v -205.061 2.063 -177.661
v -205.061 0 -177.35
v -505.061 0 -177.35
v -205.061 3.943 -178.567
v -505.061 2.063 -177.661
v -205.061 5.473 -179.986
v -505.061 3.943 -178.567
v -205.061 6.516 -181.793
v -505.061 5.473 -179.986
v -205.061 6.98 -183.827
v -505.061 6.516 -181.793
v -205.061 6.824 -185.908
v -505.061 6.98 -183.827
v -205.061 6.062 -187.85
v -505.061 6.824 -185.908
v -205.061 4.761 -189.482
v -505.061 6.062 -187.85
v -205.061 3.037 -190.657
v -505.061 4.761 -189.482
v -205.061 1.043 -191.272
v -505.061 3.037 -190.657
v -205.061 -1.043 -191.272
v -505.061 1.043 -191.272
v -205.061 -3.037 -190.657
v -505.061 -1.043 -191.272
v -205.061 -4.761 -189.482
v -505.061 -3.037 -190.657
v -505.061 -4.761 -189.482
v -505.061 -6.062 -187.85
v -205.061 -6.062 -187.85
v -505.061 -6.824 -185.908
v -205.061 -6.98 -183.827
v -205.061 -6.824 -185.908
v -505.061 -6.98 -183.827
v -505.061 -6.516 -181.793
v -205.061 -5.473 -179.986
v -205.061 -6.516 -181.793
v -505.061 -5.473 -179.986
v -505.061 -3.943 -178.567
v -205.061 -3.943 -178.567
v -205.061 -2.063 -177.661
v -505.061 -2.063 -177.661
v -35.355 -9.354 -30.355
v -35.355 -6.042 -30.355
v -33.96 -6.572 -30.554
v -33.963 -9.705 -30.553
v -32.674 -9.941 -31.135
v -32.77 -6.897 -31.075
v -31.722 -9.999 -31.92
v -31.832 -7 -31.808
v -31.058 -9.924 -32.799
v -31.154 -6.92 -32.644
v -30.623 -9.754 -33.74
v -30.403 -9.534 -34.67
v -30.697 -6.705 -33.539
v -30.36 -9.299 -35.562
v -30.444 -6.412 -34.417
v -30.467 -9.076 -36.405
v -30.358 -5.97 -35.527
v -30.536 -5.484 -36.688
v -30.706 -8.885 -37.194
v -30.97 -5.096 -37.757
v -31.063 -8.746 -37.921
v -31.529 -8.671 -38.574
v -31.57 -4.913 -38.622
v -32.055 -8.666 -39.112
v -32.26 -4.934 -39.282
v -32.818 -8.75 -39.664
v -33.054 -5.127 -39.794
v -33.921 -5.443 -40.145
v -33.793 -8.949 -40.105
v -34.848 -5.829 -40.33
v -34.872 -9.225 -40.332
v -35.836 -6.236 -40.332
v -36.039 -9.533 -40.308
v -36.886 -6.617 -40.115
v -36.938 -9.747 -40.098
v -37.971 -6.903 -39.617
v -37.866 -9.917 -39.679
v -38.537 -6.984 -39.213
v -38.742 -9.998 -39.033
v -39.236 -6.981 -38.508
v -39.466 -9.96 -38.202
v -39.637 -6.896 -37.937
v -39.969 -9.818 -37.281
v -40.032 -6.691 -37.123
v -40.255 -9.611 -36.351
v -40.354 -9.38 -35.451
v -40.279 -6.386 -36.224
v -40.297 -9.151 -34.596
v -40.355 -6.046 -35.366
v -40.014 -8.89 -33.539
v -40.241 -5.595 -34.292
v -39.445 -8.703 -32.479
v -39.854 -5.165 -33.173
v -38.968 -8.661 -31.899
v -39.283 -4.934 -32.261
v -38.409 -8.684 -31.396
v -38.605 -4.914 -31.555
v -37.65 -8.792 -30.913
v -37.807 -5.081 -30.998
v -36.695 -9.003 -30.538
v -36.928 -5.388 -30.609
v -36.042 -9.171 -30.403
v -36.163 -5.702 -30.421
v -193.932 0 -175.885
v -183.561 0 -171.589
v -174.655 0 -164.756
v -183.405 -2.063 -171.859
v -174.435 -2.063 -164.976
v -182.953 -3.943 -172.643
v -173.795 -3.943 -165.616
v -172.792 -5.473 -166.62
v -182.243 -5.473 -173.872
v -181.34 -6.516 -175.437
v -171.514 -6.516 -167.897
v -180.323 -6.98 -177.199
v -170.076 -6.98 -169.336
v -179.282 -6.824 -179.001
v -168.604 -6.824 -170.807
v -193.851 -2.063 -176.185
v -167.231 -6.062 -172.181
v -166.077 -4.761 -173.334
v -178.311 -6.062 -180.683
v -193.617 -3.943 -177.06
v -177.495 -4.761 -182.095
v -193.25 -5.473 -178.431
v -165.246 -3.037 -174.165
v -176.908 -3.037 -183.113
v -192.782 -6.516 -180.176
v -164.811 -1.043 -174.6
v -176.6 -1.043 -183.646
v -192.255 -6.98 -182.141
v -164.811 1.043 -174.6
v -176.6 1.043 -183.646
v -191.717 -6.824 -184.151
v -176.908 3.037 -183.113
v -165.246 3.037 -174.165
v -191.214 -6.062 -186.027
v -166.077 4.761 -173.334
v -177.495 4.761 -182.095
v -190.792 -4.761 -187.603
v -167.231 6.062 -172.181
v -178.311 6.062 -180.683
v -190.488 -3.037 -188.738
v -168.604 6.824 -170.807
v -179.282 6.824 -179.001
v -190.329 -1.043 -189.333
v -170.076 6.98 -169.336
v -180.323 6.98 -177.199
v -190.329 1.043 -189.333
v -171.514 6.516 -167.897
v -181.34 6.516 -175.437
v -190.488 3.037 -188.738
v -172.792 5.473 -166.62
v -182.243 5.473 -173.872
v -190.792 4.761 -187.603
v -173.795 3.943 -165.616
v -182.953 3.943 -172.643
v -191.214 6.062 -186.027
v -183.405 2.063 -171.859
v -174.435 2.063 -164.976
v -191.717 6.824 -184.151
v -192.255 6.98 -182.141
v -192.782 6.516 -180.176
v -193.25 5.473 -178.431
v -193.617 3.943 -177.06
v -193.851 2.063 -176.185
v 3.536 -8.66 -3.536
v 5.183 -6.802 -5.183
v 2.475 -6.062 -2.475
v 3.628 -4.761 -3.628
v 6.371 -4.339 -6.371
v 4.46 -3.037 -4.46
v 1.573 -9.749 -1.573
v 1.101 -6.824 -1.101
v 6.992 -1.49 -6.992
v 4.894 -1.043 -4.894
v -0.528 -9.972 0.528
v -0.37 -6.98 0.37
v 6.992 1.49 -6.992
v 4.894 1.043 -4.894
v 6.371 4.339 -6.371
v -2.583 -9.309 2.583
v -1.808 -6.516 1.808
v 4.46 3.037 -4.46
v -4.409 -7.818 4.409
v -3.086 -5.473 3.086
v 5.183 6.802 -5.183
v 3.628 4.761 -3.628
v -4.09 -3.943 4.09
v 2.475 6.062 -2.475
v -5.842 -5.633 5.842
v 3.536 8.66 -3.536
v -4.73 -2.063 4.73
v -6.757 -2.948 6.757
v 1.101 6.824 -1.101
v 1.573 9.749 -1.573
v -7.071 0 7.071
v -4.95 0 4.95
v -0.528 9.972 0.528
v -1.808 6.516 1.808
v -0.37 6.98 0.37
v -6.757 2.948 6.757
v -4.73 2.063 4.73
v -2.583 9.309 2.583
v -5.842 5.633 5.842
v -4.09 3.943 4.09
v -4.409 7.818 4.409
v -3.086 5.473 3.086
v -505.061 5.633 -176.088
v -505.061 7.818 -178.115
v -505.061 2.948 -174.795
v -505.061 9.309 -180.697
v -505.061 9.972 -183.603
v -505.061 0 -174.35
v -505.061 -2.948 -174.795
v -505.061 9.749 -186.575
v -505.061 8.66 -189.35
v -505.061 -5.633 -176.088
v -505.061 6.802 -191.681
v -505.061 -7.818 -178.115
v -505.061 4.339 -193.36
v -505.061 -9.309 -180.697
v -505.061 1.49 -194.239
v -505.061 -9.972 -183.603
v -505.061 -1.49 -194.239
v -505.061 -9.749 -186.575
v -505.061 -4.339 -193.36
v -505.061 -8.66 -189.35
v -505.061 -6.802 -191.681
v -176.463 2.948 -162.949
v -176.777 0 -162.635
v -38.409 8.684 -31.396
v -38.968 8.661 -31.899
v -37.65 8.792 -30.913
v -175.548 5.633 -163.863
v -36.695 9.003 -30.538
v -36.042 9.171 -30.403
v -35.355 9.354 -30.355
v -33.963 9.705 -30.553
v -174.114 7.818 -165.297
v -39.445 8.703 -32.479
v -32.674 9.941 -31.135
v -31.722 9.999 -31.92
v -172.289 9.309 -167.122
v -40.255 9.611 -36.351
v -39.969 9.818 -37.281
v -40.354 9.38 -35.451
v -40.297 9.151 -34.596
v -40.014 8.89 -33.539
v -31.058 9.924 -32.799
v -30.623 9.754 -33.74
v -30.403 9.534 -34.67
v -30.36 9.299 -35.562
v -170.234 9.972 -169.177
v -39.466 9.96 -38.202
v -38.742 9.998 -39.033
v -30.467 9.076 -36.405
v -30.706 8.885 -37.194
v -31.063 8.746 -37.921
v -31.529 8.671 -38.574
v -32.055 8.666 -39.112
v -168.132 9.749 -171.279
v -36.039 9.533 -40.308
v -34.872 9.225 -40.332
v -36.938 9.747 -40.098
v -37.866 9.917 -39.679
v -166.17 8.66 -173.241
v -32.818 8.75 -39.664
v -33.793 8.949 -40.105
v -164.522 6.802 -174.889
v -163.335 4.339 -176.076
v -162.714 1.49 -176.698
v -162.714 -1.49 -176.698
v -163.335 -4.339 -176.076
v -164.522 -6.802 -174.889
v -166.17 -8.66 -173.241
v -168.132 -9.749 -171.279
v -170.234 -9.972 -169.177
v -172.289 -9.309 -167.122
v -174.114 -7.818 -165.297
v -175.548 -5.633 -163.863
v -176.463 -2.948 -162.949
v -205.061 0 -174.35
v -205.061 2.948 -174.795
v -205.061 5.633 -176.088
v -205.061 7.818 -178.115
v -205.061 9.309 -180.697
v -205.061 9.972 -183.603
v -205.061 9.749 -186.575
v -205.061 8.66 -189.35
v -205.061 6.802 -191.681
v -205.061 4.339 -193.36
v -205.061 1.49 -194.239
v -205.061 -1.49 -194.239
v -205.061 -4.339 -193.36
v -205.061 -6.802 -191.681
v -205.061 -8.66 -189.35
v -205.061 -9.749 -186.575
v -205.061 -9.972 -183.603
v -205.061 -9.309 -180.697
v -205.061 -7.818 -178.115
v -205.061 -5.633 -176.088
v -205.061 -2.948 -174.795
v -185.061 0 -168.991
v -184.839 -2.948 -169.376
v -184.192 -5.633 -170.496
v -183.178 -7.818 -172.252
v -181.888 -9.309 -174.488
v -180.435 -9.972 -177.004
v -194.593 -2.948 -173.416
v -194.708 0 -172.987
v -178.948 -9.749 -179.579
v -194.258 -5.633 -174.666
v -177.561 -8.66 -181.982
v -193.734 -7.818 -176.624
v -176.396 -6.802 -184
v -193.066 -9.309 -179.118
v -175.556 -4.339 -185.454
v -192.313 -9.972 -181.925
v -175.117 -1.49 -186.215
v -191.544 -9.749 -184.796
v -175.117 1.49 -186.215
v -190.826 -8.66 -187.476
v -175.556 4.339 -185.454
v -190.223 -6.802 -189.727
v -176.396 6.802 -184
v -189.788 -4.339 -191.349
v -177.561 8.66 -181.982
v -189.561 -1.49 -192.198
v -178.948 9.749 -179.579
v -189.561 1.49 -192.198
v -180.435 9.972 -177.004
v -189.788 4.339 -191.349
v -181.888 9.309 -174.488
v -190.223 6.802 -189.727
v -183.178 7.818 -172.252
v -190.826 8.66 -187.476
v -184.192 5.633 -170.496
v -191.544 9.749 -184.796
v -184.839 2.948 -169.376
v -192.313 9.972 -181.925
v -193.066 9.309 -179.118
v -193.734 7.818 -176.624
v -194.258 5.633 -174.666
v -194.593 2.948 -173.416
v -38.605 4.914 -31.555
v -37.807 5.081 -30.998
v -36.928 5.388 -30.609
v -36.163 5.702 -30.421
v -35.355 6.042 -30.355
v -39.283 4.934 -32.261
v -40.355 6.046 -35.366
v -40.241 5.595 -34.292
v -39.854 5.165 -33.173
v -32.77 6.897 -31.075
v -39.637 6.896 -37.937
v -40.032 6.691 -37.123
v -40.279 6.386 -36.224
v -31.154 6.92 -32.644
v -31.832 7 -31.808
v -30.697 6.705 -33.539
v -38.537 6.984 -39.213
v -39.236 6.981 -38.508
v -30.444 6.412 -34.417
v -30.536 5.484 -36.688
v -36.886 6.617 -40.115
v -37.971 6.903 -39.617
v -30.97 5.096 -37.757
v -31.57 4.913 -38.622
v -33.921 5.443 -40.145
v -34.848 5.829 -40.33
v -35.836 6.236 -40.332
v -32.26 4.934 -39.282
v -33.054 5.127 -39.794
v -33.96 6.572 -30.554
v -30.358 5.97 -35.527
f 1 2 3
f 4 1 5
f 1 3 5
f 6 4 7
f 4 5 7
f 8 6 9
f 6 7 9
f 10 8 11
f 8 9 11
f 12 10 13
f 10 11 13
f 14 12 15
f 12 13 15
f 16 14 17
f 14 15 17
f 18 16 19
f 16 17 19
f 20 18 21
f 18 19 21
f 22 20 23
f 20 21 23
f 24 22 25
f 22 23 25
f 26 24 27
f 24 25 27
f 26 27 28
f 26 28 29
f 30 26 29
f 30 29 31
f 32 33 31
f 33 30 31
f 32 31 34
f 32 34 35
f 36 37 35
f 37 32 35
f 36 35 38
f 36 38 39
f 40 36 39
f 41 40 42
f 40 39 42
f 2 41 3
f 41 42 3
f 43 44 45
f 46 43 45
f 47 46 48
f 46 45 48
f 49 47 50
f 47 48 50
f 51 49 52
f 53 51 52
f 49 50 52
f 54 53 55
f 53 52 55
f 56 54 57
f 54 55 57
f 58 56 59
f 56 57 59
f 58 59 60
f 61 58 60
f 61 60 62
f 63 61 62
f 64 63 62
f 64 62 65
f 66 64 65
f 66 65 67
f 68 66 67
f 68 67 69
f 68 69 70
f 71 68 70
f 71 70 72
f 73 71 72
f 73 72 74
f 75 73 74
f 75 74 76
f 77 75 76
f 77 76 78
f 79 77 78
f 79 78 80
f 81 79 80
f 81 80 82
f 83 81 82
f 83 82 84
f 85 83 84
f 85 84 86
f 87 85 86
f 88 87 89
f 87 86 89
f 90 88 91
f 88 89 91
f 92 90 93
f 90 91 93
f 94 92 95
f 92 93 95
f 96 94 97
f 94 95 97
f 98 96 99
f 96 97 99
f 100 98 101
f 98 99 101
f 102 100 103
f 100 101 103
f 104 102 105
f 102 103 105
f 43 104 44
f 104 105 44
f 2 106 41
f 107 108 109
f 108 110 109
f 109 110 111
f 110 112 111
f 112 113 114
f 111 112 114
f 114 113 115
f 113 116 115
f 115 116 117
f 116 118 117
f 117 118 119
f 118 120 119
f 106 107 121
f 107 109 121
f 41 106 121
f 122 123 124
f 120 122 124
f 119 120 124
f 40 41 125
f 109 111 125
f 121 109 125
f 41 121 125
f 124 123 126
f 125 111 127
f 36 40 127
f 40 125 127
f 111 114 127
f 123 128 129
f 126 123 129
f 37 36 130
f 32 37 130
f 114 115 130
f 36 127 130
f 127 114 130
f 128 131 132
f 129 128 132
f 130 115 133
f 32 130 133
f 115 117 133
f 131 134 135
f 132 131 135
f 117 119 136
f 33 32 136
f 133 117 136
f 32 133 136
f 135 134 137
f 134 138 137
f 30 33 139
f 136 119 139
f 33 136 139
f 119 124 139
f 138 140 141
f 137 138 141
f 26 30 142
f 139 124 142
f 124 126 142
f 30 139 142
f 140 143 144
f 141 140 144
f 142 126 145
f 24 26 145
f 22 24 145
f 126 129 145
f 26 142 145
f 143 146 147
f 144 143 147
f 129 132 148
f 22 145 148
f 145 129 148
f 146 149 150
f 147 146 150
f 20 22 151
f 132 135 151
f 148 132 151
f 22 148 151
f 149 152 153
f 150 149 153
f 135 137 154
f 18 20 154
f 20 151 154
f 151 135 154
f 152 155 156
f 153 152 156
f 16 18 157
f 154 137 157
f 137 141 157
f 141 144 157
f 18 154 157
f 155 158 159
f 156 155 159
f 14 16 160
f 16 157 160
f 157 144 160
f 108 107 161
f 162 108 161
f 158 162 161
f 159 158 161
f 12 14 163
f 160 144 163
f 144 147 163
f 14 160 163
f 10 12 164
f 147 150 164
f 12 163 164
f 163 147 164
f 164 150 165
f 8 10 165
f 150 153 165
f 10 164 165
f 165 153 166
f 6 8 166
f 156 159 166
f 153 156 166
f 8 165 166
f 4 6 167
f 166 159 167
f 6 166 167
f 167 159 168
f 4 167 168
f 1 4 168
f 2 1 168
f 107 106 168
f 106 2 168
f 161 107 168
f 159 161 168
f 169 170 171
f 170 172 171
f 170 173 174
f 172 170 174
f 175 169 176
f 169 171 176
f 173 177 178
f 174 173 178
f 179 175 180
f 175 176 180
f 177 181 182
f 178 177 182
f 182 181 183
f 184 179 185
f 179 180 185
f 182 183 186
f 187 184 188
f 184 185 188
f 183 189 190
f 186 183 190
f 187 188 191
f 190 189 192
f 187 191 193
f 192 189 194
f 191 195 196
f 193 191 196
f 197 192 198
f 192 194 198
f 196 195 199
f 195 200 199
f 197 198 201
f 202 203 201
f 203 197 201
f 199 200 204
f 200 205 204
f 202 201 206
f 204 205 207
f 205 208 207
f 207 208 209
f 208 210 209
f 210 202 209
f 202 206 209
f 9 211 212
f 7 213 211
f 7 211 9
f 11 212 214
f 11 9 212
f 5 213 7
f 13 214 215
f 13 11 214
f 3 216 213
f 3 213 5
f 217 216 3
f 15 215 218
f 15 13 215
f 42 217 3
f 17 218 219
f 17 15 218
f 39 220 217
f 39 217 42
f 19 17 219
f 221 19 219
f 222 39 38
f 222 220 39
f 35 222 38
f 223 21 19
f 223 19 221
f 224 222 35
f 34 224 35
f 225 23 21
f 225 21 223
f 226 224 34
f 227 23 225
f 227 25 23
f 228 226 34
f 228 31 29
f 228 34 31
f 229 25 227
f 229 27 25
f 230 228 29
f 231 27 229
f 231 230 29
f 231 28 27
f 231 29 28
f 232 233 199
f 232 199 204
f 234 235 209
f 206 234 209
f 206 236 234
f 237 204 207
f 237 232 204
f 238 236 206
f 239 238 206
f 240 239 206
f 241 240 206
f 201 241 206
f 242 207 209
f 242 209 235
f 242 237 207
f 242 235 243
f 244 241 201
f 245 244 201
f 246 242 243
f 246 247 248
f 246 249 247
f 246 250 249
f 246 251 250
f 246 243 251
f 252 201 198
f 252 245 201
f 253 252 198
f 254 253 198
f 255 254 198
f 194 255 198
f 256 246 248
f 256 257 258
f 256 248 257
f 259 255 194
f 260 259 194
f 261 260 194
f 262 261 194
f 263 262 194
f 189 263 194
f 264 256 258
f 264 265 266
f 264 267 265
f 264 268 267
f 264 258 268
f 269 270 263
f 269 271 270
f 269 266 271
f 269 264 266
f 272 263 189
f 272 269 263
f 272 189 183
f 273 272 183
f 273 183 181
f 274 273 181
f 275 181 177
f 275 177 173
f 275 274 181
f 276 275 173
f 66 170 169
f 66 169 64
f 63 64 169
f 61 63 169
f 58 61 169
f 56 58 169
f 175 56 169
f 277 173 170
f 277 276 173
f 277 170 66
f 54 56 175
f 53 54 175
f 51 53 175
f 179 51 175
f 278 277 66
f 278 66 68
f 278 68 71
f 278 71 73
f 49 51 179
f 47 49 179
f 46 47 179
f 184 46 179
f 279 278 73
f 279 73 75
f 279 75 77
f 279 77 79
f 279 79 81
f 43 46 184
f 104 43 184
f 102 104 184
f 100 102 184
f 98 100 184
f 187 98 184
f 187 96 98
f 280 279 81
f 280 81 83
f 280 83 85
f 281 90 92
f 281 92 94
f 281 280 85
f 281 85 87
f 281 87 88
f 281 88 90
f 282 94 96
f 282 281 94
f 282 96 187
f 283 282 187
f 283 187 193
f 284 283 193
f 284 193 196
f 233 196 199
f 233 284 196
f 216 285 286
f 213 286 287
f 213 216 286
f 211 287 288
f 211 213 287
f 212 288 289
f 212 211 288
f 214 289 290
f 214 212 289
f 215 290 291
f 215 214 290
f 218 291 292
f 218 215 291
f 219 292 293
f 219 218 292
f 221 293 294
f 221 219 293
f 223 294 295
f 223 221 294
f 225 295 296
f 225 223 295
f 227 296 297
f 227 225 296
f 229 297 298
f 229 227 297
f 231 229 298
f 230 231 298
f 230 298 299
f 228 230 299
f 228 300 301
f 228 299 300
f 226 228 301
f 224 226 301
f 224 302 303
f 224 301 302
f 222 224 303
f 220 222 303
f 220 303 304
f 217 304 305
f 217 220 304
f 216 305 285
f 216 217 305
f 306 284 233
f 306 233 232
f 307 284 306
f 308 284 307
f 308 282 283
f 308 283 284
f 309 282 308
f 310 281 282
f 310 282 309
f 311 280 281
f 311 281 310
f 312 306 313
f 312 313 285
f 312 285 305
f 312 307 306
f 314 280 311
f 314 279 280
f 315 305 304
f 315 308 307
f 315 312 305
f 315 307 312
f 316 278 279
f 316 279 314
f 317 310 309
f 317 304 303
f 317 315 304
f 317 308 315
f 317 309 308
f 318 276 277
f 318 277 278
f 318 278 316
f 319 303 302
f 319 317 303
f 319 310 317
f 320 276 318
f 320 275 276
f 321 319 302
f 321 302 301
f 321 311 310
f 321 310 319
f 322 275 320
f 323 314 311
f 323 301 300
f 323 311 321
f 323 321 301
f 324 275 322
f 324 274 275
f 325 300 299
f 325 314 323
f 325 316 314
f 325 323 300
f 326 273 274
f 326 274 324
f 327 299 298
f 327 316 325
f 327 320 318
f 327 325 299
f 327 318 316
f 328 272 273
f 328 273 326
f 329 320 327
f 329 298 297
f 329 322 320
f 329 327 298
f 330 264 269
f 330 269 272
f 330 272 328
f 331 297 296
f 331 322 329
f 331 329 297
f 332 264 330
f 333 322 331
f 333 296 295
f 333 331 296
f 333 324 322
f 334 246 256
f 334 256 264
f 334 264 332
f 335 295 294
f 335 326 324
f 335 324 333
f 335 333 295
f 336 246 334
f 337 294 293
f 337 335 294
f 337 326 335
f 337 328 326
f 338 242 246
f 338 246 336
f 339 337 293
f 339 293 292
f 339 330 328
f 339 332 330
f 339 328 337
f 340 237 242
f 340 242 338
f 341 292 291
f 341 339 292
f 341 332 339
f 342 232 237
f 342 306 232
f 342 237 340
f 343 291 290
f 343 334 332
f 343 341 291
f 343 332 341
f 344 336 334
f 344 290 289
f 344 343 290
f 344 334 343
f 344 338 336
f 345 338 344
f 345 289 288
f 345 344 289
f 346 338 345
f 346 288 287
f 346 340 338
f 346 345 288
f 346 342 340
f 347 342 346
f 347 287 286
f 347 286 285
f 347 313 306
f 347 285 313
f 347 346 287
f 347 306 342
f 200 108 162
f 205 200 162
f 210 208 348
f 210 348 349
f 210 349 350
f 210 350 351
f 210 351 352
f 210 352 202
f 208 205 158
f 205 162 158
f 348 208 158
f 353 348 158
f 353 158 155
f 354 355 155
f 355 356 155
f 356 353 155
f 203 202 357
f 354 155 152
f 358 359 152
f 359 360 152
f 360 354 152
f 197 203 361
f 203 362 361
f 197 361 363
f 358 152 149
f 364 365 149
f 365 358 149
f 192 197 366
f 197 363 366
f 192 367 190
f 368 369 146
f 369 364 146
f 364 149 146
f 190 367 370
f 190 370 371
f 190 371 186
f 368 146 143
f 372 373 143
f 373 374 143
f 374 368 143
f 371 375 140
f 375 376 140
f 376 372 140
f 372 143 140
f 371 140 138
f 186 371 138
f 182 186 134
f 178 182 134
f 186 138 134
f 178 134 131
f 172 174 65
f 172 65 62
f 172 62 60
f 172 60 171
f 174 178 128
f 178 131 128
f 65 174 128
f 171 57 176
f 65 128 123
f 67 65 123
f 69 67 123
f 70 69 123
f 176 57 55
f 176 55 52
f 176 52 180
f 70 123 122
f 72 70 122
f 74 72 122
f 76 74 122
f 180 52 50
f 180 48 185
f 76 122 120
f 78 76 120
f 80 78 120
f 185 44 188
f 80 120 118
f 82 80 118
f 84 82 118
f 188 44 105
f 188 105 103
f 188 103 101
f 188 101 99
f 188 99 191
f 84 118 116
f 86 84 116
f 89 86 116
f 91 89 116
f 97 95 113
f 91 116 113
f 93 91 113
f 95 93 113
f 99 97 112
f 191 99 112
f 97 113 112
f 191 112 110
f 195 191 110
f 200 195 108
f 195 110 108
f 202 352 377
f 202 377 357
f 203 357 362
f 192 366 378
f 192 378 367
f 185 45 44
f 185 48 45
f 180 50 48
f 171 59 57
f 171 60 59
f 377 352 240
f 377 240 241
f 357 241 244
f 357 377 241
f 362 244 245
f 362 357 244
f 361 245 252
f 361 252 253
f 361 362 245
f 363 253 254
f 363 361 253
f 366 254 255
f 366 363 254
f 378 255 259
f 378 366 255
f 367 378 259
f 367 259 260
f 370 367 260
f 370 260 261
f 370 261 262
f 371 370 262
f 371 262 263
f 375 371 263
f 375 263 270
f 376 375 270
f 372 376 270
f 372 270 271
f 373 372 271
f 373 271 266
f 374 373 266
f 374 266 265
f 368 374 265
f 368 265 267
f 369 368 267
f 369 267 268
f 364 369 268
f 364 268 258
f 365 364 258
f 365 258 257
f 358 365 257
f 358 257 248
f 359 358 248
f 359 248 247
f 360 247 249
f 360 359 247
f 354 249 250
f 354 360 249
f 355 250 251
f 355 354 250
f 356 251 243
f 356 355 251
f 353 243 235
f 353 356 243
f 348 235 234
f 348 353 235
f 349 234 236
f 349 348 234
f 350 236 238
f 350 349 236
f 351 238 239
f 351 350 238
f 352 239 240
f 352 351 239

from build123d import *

# Parameters (mm, degrees)
SWEEP_THIN1_PROFILE_R   = 10
SWEEP_THIN1_PROFILE_R_2 = 7
SKETCH22_R              = 5
CUT_EXTRUDE1_DEPTH      = 542.256514583
CUT_EXTRUDE1_DEPTH_BACK = 542.256514583


with BuildPart() as part:
    # Sweep-Thin1: sweep along a path in Sketch1
    with BuildLine(Plane(origin=(0, 0, 0), x_dir=(1, 0, 0), z_dir=(0, 1, 0))) as sweep_thin1_path:
        Line((0, 0), (-169.705627485, 169.705627485))
        ThreePointArc((-169.705627485, 169.705627485), (-185.926794926, 180.544265051), (-205.060966544, 184.350288425))
        Line((-205.060966544, 184.350288425), (-505.060966544, 184.350288425))
    # Sweep-Thin1 profile (on start of the path) → Sweep-Thin1 (sweep)
    with BuildSketch(Plane(origin=(0, 0, 0), x_dir=(-0.7071067811865487, 0, 0.7071067811865465), z_dir=(-0.7071067811865465, 0, -0.7071067811865487))):
        Circle(SWEEP_THIN1_PROFILE_R)
        Circle(SWEEP_THIN1_PROFILE_R_2, mode=Mode.SUBTRACT)
    sweep(path=sweep_thin1_path.line)

    # Sketch22 → Cut-Extrude1 (cut, two sides)
    with BuildSketch(Plane(origin=(0, 0, 0), x_dir=(1, 0, 0), z_dir=(0, 1, 0))) as cut_extrude1_sk:
        with Locations(Location((-35.355339059, 35.355339059, 0), (0, 0, 270))):
            Circle(SKETCH22_R)
    extrude(amount=CUT_EXTRUDE1_DEPTH, mode=Mode.SUBTRACT)
    extrude(cut_extrude1_sk.sketch, amount=-CUT_EXTRUDE1_DEPTH_BACK, mode=Mode.SUBTRACT)


solid = part.part
